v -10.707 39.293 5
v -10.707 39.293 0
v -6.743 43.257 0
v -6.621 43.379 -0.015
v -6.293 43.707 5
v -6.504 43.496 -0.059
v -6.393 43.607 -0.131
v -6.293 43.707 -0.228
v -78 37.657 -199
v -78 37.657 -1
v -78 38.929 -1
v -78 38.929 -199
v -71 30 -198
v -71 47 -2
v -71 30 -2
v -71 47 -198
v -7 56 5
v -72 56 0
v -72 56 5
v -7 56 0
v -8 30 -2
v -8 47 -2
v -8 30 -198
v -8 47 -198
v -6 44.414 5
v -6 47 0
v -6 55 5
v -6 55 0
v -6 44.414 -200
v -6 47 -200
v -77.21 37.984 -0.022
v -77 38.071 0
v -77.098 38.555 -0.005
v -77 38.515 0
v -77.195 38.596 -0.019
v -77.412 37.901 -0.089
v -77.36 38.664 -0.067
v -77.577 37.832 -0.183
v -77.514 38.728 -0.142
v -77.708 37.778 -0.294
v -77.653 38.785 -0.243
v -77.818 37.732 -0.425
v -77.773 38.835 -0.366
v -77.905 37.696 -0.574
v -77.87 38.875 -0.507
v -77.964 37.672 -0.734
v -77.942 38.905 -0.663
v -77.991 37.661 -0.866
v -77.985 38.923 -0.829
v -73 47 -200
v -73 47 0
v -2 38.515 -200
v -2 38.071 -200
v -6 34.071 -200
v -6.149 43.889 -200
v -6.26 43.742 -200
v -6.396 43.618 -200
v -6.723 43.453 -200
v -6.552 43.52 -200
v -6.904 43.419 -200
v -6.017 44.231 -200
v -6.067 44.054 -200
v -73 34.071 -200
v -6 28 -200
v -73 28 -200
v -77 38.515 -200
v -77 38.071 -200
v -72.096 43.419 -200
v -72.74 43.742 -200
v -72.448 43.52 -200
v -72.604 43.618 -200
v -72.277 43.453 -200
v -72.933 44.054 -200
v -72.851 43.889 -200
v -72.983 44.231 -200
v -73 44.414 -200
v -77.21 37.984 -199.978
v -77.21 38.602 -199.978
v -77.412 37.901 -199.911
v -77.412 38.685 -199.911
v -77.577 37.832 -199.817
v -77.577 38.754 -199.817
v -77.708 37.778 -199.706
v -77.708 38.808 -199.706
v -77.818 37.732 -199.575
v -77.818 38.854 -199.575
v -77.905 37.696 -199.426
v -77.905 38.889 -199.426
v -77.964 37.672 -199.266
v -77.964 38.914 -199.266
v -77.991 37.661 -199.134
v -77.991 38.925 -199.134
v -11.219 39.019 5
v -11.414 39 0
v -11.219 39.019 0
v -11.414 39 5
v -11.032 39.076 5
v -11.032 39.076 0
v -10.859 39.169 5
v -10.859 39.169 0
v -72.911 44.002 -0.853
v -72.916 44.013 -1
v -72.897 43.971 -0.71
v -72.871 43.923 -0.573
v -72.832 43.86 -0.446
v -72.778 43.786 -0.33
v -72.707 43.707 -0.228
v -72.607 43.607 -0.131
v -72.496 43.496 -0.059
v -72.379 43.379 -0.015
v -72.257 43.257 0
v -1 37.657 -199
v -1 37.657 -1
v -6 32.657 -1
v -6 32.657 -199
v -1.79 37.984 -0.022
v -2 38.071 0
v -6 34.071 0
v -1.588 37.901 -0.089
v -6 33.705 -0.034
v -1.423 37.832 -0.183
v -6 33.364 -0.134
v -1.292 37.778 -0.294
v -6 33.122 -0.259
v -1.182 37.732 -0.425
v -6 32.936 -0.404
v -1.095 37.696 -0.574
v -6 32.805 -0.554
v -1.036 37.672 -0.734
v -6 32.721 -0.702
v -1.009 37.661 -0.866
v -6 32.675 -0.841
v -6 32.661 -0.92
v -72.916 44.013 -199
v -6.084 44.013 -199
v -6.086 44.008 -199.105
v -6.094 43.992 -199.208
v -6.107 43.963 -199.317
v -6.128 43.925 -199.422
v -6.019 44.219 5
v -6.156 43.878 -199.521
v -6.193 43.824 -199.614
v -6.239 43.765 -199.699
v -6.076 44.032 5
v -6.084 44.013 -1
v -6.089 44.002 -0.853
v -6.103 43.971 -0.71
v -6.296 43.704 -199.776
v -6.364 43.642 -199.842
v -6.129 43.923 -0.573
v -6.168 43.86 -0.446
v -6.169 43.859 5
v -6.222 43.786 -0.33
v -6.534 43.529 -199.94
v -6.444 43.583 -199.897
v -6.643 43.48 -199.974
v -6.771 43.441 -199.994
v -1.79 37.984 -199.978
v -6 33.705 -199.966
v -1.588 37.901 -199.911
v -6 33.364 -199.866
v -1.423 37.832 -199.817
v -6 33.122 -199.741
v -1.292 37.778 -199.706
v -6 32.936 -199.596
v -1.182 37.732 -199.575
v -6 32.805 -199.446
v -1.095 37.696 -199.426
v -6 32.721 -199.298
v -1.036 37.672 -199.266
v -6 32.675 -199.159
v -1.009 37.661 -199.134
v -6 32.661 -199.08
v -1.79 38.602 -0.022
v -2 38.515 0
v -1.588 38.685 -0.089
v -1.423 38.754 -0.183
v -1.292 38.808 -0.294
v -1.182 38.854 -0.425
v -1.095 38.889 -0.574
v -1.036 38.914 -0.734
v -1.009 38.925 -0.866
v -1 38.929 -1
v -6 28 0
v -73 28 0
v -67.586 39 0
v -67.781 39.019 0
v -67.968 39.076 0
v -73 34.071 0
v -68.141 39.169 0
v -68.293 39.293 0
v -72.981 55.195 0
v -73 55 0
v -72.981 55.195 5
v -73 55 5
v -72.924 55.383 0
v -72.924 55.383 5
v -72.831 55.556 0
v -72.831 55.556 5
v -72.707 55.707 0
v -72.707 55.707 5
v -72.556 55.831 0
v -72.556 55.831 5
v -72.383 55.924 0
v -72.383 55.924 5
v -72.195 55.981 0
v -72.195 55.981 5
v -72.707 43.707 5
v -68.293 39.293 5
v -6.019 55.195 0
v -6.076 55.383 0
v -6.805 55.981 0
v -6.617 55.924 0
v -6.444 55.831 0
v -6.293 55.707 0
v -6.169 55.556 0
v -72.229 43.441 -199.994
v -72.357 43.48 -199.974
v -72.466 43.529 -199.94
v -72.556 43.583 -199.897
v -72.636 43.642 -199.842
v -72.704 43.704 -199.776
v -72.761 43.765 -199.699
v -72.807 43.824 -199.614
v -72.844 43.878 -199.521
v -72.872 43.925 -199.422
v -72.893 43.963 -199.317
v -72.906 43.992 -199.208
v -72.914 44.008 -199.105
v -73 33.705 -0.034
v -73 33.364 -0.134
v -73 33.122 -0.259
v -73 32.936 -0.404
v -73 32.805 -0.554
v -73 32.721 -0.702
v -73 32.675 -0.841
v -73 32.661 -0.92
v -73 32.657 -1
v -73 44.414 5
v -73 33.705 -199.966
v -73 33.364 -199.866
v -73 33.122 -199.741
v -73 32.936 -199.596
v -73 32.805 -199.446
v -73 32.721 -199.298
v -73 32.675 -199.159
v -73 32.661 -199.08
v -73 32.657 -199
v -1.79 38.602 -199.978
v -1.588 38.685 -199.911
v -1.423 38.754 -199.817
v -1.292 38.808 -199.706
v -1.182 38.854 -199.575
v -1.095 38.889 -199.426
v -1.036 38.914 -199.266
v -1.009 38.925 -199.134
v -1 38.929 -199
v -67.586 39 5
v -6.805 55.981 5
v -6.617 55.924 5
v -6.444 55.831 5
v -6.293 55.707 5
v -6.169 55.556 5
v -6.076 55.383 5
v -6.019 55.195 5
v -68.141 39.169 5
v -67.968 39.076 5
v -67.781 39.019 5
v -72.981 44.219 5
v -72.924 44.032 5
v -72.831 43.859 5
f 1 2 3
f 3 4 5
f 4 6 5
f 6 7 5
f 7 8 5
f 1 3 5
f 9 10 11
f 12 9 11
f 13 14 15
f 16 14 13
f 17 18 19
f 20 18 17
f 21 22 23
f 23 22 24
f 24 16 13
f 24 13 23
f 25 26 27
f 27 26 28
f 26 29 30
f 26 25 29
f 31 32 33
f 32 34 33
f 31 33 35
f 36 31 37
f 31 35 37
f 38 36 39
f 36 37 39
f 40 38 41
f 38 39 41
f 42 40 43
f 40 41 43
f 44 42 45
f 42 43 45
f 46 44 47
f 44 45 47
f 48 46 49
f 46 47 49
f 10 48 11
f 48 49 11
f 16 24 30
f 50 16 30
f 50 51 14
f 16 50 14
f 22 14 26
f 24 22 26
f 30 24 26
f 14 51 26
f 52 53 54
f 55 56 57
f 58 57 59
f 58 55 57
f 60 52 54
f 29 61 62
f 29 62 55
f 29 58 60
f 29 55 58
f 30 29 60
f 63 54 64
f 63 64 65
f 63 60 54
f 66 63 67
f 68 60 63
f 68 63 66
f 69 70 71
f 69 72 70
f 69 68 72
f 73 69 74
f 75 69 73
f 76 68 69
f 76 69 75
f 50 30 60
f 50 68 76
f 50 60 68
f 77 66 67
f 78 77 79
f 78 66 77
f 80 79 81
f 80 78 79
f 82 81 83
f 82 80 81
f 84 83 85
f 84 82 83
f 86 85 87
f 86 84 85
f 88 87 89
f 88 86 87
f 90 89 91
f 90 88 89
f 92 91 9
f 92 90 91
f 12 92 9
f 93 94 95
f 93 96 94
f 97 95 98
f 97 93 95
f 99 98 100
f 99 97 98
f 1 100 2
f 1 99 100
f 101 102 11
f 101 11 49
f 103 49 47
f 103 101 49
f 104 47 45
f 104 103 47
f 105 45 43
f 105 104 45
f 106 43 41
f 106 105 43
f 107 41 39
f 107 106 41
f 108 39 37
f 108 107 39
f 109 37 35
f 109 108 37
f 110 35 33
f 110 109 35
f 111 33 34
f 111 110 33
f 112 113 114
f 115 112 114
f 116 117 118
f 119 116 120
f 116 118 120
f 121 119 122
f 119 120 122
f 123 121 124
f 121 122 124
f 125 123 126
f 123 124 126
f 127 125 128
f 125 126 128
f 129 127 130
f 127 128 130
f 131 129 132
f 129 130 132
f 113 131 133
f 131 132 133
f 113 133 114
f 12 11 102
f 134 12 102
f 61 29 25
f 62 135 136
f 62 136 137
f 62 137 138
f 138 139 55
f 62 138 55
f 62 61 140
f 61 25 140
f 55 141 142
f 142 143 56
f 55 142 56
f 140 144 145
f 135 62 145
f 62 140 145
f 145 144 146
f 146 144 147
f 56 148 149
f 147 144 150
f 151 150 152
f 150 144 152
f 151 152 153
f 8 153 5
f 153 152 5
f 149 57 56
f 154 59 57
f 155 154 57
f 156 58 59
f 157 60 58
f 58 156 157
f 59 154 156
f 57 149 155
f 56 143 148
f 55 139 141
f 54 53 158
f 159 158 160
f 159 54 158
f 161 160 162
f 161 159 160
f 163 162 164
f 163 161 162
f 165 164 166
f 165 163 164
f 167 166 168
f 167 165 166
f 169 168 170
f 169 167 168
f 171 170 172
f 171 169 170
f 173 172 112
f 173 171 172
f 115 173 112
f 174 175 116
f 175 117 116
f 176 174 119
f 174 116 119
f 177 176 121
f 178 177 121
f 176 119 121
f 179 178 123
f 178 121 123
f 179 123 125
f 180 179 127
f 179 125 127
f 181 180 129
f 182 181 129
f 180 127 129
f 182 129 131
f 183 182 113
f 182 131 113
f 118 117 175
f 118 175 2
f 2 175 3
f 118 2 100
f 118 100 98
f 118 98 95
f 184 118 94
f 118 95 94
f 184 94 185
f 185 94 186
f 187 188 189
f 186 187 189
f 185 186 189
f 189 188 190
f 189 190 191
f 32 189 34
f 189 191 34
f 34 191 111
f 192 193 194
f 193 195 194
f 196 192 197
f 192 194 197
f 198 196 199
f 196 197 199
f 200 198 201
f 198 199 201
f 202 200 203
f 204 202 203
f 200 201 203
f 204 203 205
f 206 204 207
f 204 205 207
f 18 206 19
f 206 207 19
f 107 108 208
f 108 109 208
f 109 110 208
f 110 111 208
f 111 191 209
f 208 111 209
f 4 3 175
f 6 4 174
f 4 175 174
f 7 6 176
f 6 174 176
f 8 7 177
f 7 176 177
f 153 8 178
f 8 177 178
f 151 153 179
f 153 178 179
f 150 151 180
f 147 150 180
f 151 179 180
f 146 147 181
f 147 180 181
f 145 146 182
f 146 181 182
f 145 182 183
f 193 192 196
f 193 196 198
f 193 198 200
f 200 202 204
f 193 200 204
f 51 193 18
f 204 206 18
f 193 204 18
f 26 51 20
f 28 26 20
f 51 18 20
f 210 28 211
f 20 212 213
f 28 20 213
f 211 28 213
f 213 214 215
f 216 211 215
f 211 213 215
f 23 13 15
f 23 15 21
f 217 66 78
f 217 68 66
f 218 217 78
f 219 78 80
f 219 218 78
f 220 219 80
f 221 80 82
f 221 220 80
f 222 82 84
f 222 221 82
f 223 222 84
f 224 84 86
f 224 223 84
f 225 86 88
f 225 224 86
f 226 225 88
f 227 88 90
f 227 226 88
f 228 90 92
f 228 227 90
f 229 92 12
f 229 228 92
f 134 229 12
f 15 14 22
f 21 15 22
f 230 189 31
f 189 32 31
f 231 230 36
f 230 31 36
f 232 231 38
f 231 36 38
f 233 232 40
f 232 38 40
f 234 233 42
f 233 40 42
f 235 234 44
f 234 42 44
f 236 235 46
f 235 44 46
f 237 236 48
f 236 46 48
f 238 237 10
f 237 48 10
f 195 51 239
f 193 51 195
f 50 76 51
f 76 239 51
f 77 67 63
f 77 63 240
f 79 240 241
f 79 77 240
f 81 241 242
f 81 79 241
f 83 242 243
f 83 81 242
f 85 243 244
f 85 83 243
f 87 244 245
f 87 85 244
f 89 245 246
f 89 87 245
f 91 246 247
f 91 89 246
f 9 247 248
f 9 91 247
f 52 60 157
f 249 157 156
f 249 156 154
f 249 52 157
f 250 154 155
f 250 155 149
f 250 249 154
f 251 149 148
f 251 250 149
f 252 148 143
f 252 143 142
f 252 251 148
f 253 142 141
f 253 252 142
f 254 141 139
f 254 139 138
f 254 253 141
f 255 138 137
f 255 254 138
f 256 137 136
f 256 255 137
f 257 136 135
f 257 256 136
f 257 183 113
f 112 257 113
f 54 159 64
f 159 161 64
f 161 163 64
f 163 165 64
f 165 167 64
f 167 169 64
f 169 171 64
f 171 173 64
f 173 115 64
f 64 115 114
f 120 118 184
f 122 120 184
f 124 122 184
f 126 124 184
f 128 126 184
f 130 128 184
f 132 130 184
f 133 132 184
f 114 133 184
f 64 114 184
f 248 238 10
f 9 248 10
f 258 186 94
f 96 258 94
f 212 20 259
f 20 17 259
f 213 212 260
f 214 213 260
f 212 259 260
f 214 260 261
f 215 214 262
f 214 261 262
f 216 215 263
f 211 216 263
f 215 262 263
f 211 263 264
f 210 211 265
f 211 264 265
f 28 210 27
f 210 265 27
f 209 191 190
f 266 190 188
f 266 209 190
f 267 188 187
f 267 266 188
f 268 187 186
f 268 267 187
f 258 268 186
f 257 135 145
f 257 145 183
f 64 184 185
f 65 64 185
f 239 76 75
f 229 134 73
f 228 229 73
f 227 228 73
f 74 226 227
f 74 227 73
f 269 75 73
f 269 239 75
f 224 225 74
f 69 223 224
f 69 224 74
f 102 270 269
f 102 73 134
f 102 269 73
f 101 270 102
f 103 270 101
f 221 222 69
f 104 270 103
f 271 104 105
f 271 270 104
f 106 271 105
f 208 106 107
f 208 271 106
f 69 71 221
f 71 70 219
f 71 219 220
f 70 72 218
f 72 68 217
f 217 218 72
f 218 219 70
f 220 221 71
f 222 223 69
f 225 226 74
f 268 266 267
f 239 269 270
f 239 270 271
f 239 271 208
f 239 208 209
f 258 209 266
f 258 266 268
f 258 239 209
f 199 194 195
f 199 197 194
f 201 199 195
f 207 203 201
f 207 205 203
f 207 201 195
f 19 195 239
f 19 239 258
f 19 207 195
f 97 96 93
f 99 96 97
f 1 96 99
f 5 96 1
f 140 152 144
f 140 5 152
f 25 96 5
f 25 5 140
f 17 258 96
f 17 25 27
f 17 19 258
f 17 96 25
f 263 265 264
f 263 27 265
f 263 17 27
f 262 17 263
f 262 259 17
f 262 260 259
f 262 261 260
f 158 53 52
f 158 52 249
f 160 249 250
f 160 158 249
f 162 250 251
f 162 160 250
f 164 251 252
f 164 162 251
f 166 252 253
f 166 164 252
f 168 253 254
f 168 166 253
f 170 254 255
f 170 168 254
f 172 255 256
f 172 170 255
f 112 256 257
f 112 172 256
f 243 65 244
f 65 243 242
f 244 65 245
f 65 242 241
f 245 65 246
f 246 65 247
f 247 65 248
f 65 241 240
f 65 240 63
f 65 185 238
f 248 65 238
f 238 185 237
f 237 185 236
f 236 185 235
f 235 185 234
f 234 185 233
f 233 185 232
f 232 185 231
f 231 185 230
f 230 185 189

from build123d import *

# Parameters (mm, degrees)
EXTRUDE_1_DEPTH     = 200
SKETCH_2_W          = 63
SKETCH_2_H          = 196
CUT_EXTRUDE_1_DEPTH = 17
SKETCH_4_W          = 67
SKETCH_4_H          = 17
EXTRUDE_2_DEPTH     = 5
CHAMFER_1_SIZE      = 5
FILLET_1_R          = 1
FILLET_3_R          = 1


with BuildPart() as part:
    # 草图1 → 凸台-拉伸1 (new body)
    with BuildSketch(Plane.XY):
        Polygon((-6, 28), (-73, 28), (-73, 32.656854249), (-78, 37.656854249), (-78, 38.928932188), (-73, 43.928932188), (-73, 47), (-6, 47), (-6, 43.928932188), (-1, 38.928932188), (-1, 37.656854249), (-6, 32.656854249), align=None)
    extrude(amount=-EXTRUDE_1_DEPTH)

    # 草图2 → 切除-拉伸1 (cut)
    with BuildSketch(Plane(origin=(0, 47, 0), x_dir=(1, 0, 0), z_dir=(0, 1, 0))):
        with Locations((-39.5, 100)):
            Rectangle(SKETCH_2_W, SKETCH_2_H)
    extrude(amount=-CUT_EXTRUDE_1_DEPTH, mode=Mode.SUBTRACT)

    # 草图4 → 凸台-拉伸2 (add)
    with BuildSketch(Plane.XY):
        with Locations((-39.5, 47.5)):
            Rectangle(SKETCH_4_W, SKETCH_4_H)
    extrude(amount=EXTRUDE_2_DEPTH)

    # 倒角1
    chamfer_1_edges = [part.edges().sort_by_distance(p)[0] for p in [
        (-73, 39, 2.5),
        (-6, 39, 2.5),
    ]]
    chamfer(chamfer_1_edges, length=CHAMFER_1_SIZE)

    # 圆角1
    fillet_1_edges = [part.edges().sort_by_distance(p)[0] for p in [
        (-68, 39, 2.5),
        (-73, 44, -97.5),
        (-11, 39, 2.5),
        (-6, 44, -97.5),
        (-6, 56, 2.5),
        (-73, 56, 2.5),
    ]]
    fillet(fillet_1_edges, radius=FILLET_1_R)

    # 圆角3
    fillet_3_edges = [part.edges().sort_by_distance(p)[0] for p in [
        (-75.5, 35.156854249, 0),
        (-75.457984297, 41.470947892, 0),
        (-78, 38.292893219, 0),
        (-75.5, 35.156854249, -200),
        (-78, 38.292893219, -200),
        (-75.457984297, 41.470947892, -200),
        (-3.5, 35.156854249, -200),
        (-1, 38.292893219, -200),
        (-3.542015703, 41.470947892, -200),
        (-3.5, 35.156854249, 0),
        (-1, 38.292893219, 0),
        (-3.542015703, 41.470947892, 0),
    ]]
    fillet(fillet_3_edges, radius=FILLET_3_R)


solid = part.part
